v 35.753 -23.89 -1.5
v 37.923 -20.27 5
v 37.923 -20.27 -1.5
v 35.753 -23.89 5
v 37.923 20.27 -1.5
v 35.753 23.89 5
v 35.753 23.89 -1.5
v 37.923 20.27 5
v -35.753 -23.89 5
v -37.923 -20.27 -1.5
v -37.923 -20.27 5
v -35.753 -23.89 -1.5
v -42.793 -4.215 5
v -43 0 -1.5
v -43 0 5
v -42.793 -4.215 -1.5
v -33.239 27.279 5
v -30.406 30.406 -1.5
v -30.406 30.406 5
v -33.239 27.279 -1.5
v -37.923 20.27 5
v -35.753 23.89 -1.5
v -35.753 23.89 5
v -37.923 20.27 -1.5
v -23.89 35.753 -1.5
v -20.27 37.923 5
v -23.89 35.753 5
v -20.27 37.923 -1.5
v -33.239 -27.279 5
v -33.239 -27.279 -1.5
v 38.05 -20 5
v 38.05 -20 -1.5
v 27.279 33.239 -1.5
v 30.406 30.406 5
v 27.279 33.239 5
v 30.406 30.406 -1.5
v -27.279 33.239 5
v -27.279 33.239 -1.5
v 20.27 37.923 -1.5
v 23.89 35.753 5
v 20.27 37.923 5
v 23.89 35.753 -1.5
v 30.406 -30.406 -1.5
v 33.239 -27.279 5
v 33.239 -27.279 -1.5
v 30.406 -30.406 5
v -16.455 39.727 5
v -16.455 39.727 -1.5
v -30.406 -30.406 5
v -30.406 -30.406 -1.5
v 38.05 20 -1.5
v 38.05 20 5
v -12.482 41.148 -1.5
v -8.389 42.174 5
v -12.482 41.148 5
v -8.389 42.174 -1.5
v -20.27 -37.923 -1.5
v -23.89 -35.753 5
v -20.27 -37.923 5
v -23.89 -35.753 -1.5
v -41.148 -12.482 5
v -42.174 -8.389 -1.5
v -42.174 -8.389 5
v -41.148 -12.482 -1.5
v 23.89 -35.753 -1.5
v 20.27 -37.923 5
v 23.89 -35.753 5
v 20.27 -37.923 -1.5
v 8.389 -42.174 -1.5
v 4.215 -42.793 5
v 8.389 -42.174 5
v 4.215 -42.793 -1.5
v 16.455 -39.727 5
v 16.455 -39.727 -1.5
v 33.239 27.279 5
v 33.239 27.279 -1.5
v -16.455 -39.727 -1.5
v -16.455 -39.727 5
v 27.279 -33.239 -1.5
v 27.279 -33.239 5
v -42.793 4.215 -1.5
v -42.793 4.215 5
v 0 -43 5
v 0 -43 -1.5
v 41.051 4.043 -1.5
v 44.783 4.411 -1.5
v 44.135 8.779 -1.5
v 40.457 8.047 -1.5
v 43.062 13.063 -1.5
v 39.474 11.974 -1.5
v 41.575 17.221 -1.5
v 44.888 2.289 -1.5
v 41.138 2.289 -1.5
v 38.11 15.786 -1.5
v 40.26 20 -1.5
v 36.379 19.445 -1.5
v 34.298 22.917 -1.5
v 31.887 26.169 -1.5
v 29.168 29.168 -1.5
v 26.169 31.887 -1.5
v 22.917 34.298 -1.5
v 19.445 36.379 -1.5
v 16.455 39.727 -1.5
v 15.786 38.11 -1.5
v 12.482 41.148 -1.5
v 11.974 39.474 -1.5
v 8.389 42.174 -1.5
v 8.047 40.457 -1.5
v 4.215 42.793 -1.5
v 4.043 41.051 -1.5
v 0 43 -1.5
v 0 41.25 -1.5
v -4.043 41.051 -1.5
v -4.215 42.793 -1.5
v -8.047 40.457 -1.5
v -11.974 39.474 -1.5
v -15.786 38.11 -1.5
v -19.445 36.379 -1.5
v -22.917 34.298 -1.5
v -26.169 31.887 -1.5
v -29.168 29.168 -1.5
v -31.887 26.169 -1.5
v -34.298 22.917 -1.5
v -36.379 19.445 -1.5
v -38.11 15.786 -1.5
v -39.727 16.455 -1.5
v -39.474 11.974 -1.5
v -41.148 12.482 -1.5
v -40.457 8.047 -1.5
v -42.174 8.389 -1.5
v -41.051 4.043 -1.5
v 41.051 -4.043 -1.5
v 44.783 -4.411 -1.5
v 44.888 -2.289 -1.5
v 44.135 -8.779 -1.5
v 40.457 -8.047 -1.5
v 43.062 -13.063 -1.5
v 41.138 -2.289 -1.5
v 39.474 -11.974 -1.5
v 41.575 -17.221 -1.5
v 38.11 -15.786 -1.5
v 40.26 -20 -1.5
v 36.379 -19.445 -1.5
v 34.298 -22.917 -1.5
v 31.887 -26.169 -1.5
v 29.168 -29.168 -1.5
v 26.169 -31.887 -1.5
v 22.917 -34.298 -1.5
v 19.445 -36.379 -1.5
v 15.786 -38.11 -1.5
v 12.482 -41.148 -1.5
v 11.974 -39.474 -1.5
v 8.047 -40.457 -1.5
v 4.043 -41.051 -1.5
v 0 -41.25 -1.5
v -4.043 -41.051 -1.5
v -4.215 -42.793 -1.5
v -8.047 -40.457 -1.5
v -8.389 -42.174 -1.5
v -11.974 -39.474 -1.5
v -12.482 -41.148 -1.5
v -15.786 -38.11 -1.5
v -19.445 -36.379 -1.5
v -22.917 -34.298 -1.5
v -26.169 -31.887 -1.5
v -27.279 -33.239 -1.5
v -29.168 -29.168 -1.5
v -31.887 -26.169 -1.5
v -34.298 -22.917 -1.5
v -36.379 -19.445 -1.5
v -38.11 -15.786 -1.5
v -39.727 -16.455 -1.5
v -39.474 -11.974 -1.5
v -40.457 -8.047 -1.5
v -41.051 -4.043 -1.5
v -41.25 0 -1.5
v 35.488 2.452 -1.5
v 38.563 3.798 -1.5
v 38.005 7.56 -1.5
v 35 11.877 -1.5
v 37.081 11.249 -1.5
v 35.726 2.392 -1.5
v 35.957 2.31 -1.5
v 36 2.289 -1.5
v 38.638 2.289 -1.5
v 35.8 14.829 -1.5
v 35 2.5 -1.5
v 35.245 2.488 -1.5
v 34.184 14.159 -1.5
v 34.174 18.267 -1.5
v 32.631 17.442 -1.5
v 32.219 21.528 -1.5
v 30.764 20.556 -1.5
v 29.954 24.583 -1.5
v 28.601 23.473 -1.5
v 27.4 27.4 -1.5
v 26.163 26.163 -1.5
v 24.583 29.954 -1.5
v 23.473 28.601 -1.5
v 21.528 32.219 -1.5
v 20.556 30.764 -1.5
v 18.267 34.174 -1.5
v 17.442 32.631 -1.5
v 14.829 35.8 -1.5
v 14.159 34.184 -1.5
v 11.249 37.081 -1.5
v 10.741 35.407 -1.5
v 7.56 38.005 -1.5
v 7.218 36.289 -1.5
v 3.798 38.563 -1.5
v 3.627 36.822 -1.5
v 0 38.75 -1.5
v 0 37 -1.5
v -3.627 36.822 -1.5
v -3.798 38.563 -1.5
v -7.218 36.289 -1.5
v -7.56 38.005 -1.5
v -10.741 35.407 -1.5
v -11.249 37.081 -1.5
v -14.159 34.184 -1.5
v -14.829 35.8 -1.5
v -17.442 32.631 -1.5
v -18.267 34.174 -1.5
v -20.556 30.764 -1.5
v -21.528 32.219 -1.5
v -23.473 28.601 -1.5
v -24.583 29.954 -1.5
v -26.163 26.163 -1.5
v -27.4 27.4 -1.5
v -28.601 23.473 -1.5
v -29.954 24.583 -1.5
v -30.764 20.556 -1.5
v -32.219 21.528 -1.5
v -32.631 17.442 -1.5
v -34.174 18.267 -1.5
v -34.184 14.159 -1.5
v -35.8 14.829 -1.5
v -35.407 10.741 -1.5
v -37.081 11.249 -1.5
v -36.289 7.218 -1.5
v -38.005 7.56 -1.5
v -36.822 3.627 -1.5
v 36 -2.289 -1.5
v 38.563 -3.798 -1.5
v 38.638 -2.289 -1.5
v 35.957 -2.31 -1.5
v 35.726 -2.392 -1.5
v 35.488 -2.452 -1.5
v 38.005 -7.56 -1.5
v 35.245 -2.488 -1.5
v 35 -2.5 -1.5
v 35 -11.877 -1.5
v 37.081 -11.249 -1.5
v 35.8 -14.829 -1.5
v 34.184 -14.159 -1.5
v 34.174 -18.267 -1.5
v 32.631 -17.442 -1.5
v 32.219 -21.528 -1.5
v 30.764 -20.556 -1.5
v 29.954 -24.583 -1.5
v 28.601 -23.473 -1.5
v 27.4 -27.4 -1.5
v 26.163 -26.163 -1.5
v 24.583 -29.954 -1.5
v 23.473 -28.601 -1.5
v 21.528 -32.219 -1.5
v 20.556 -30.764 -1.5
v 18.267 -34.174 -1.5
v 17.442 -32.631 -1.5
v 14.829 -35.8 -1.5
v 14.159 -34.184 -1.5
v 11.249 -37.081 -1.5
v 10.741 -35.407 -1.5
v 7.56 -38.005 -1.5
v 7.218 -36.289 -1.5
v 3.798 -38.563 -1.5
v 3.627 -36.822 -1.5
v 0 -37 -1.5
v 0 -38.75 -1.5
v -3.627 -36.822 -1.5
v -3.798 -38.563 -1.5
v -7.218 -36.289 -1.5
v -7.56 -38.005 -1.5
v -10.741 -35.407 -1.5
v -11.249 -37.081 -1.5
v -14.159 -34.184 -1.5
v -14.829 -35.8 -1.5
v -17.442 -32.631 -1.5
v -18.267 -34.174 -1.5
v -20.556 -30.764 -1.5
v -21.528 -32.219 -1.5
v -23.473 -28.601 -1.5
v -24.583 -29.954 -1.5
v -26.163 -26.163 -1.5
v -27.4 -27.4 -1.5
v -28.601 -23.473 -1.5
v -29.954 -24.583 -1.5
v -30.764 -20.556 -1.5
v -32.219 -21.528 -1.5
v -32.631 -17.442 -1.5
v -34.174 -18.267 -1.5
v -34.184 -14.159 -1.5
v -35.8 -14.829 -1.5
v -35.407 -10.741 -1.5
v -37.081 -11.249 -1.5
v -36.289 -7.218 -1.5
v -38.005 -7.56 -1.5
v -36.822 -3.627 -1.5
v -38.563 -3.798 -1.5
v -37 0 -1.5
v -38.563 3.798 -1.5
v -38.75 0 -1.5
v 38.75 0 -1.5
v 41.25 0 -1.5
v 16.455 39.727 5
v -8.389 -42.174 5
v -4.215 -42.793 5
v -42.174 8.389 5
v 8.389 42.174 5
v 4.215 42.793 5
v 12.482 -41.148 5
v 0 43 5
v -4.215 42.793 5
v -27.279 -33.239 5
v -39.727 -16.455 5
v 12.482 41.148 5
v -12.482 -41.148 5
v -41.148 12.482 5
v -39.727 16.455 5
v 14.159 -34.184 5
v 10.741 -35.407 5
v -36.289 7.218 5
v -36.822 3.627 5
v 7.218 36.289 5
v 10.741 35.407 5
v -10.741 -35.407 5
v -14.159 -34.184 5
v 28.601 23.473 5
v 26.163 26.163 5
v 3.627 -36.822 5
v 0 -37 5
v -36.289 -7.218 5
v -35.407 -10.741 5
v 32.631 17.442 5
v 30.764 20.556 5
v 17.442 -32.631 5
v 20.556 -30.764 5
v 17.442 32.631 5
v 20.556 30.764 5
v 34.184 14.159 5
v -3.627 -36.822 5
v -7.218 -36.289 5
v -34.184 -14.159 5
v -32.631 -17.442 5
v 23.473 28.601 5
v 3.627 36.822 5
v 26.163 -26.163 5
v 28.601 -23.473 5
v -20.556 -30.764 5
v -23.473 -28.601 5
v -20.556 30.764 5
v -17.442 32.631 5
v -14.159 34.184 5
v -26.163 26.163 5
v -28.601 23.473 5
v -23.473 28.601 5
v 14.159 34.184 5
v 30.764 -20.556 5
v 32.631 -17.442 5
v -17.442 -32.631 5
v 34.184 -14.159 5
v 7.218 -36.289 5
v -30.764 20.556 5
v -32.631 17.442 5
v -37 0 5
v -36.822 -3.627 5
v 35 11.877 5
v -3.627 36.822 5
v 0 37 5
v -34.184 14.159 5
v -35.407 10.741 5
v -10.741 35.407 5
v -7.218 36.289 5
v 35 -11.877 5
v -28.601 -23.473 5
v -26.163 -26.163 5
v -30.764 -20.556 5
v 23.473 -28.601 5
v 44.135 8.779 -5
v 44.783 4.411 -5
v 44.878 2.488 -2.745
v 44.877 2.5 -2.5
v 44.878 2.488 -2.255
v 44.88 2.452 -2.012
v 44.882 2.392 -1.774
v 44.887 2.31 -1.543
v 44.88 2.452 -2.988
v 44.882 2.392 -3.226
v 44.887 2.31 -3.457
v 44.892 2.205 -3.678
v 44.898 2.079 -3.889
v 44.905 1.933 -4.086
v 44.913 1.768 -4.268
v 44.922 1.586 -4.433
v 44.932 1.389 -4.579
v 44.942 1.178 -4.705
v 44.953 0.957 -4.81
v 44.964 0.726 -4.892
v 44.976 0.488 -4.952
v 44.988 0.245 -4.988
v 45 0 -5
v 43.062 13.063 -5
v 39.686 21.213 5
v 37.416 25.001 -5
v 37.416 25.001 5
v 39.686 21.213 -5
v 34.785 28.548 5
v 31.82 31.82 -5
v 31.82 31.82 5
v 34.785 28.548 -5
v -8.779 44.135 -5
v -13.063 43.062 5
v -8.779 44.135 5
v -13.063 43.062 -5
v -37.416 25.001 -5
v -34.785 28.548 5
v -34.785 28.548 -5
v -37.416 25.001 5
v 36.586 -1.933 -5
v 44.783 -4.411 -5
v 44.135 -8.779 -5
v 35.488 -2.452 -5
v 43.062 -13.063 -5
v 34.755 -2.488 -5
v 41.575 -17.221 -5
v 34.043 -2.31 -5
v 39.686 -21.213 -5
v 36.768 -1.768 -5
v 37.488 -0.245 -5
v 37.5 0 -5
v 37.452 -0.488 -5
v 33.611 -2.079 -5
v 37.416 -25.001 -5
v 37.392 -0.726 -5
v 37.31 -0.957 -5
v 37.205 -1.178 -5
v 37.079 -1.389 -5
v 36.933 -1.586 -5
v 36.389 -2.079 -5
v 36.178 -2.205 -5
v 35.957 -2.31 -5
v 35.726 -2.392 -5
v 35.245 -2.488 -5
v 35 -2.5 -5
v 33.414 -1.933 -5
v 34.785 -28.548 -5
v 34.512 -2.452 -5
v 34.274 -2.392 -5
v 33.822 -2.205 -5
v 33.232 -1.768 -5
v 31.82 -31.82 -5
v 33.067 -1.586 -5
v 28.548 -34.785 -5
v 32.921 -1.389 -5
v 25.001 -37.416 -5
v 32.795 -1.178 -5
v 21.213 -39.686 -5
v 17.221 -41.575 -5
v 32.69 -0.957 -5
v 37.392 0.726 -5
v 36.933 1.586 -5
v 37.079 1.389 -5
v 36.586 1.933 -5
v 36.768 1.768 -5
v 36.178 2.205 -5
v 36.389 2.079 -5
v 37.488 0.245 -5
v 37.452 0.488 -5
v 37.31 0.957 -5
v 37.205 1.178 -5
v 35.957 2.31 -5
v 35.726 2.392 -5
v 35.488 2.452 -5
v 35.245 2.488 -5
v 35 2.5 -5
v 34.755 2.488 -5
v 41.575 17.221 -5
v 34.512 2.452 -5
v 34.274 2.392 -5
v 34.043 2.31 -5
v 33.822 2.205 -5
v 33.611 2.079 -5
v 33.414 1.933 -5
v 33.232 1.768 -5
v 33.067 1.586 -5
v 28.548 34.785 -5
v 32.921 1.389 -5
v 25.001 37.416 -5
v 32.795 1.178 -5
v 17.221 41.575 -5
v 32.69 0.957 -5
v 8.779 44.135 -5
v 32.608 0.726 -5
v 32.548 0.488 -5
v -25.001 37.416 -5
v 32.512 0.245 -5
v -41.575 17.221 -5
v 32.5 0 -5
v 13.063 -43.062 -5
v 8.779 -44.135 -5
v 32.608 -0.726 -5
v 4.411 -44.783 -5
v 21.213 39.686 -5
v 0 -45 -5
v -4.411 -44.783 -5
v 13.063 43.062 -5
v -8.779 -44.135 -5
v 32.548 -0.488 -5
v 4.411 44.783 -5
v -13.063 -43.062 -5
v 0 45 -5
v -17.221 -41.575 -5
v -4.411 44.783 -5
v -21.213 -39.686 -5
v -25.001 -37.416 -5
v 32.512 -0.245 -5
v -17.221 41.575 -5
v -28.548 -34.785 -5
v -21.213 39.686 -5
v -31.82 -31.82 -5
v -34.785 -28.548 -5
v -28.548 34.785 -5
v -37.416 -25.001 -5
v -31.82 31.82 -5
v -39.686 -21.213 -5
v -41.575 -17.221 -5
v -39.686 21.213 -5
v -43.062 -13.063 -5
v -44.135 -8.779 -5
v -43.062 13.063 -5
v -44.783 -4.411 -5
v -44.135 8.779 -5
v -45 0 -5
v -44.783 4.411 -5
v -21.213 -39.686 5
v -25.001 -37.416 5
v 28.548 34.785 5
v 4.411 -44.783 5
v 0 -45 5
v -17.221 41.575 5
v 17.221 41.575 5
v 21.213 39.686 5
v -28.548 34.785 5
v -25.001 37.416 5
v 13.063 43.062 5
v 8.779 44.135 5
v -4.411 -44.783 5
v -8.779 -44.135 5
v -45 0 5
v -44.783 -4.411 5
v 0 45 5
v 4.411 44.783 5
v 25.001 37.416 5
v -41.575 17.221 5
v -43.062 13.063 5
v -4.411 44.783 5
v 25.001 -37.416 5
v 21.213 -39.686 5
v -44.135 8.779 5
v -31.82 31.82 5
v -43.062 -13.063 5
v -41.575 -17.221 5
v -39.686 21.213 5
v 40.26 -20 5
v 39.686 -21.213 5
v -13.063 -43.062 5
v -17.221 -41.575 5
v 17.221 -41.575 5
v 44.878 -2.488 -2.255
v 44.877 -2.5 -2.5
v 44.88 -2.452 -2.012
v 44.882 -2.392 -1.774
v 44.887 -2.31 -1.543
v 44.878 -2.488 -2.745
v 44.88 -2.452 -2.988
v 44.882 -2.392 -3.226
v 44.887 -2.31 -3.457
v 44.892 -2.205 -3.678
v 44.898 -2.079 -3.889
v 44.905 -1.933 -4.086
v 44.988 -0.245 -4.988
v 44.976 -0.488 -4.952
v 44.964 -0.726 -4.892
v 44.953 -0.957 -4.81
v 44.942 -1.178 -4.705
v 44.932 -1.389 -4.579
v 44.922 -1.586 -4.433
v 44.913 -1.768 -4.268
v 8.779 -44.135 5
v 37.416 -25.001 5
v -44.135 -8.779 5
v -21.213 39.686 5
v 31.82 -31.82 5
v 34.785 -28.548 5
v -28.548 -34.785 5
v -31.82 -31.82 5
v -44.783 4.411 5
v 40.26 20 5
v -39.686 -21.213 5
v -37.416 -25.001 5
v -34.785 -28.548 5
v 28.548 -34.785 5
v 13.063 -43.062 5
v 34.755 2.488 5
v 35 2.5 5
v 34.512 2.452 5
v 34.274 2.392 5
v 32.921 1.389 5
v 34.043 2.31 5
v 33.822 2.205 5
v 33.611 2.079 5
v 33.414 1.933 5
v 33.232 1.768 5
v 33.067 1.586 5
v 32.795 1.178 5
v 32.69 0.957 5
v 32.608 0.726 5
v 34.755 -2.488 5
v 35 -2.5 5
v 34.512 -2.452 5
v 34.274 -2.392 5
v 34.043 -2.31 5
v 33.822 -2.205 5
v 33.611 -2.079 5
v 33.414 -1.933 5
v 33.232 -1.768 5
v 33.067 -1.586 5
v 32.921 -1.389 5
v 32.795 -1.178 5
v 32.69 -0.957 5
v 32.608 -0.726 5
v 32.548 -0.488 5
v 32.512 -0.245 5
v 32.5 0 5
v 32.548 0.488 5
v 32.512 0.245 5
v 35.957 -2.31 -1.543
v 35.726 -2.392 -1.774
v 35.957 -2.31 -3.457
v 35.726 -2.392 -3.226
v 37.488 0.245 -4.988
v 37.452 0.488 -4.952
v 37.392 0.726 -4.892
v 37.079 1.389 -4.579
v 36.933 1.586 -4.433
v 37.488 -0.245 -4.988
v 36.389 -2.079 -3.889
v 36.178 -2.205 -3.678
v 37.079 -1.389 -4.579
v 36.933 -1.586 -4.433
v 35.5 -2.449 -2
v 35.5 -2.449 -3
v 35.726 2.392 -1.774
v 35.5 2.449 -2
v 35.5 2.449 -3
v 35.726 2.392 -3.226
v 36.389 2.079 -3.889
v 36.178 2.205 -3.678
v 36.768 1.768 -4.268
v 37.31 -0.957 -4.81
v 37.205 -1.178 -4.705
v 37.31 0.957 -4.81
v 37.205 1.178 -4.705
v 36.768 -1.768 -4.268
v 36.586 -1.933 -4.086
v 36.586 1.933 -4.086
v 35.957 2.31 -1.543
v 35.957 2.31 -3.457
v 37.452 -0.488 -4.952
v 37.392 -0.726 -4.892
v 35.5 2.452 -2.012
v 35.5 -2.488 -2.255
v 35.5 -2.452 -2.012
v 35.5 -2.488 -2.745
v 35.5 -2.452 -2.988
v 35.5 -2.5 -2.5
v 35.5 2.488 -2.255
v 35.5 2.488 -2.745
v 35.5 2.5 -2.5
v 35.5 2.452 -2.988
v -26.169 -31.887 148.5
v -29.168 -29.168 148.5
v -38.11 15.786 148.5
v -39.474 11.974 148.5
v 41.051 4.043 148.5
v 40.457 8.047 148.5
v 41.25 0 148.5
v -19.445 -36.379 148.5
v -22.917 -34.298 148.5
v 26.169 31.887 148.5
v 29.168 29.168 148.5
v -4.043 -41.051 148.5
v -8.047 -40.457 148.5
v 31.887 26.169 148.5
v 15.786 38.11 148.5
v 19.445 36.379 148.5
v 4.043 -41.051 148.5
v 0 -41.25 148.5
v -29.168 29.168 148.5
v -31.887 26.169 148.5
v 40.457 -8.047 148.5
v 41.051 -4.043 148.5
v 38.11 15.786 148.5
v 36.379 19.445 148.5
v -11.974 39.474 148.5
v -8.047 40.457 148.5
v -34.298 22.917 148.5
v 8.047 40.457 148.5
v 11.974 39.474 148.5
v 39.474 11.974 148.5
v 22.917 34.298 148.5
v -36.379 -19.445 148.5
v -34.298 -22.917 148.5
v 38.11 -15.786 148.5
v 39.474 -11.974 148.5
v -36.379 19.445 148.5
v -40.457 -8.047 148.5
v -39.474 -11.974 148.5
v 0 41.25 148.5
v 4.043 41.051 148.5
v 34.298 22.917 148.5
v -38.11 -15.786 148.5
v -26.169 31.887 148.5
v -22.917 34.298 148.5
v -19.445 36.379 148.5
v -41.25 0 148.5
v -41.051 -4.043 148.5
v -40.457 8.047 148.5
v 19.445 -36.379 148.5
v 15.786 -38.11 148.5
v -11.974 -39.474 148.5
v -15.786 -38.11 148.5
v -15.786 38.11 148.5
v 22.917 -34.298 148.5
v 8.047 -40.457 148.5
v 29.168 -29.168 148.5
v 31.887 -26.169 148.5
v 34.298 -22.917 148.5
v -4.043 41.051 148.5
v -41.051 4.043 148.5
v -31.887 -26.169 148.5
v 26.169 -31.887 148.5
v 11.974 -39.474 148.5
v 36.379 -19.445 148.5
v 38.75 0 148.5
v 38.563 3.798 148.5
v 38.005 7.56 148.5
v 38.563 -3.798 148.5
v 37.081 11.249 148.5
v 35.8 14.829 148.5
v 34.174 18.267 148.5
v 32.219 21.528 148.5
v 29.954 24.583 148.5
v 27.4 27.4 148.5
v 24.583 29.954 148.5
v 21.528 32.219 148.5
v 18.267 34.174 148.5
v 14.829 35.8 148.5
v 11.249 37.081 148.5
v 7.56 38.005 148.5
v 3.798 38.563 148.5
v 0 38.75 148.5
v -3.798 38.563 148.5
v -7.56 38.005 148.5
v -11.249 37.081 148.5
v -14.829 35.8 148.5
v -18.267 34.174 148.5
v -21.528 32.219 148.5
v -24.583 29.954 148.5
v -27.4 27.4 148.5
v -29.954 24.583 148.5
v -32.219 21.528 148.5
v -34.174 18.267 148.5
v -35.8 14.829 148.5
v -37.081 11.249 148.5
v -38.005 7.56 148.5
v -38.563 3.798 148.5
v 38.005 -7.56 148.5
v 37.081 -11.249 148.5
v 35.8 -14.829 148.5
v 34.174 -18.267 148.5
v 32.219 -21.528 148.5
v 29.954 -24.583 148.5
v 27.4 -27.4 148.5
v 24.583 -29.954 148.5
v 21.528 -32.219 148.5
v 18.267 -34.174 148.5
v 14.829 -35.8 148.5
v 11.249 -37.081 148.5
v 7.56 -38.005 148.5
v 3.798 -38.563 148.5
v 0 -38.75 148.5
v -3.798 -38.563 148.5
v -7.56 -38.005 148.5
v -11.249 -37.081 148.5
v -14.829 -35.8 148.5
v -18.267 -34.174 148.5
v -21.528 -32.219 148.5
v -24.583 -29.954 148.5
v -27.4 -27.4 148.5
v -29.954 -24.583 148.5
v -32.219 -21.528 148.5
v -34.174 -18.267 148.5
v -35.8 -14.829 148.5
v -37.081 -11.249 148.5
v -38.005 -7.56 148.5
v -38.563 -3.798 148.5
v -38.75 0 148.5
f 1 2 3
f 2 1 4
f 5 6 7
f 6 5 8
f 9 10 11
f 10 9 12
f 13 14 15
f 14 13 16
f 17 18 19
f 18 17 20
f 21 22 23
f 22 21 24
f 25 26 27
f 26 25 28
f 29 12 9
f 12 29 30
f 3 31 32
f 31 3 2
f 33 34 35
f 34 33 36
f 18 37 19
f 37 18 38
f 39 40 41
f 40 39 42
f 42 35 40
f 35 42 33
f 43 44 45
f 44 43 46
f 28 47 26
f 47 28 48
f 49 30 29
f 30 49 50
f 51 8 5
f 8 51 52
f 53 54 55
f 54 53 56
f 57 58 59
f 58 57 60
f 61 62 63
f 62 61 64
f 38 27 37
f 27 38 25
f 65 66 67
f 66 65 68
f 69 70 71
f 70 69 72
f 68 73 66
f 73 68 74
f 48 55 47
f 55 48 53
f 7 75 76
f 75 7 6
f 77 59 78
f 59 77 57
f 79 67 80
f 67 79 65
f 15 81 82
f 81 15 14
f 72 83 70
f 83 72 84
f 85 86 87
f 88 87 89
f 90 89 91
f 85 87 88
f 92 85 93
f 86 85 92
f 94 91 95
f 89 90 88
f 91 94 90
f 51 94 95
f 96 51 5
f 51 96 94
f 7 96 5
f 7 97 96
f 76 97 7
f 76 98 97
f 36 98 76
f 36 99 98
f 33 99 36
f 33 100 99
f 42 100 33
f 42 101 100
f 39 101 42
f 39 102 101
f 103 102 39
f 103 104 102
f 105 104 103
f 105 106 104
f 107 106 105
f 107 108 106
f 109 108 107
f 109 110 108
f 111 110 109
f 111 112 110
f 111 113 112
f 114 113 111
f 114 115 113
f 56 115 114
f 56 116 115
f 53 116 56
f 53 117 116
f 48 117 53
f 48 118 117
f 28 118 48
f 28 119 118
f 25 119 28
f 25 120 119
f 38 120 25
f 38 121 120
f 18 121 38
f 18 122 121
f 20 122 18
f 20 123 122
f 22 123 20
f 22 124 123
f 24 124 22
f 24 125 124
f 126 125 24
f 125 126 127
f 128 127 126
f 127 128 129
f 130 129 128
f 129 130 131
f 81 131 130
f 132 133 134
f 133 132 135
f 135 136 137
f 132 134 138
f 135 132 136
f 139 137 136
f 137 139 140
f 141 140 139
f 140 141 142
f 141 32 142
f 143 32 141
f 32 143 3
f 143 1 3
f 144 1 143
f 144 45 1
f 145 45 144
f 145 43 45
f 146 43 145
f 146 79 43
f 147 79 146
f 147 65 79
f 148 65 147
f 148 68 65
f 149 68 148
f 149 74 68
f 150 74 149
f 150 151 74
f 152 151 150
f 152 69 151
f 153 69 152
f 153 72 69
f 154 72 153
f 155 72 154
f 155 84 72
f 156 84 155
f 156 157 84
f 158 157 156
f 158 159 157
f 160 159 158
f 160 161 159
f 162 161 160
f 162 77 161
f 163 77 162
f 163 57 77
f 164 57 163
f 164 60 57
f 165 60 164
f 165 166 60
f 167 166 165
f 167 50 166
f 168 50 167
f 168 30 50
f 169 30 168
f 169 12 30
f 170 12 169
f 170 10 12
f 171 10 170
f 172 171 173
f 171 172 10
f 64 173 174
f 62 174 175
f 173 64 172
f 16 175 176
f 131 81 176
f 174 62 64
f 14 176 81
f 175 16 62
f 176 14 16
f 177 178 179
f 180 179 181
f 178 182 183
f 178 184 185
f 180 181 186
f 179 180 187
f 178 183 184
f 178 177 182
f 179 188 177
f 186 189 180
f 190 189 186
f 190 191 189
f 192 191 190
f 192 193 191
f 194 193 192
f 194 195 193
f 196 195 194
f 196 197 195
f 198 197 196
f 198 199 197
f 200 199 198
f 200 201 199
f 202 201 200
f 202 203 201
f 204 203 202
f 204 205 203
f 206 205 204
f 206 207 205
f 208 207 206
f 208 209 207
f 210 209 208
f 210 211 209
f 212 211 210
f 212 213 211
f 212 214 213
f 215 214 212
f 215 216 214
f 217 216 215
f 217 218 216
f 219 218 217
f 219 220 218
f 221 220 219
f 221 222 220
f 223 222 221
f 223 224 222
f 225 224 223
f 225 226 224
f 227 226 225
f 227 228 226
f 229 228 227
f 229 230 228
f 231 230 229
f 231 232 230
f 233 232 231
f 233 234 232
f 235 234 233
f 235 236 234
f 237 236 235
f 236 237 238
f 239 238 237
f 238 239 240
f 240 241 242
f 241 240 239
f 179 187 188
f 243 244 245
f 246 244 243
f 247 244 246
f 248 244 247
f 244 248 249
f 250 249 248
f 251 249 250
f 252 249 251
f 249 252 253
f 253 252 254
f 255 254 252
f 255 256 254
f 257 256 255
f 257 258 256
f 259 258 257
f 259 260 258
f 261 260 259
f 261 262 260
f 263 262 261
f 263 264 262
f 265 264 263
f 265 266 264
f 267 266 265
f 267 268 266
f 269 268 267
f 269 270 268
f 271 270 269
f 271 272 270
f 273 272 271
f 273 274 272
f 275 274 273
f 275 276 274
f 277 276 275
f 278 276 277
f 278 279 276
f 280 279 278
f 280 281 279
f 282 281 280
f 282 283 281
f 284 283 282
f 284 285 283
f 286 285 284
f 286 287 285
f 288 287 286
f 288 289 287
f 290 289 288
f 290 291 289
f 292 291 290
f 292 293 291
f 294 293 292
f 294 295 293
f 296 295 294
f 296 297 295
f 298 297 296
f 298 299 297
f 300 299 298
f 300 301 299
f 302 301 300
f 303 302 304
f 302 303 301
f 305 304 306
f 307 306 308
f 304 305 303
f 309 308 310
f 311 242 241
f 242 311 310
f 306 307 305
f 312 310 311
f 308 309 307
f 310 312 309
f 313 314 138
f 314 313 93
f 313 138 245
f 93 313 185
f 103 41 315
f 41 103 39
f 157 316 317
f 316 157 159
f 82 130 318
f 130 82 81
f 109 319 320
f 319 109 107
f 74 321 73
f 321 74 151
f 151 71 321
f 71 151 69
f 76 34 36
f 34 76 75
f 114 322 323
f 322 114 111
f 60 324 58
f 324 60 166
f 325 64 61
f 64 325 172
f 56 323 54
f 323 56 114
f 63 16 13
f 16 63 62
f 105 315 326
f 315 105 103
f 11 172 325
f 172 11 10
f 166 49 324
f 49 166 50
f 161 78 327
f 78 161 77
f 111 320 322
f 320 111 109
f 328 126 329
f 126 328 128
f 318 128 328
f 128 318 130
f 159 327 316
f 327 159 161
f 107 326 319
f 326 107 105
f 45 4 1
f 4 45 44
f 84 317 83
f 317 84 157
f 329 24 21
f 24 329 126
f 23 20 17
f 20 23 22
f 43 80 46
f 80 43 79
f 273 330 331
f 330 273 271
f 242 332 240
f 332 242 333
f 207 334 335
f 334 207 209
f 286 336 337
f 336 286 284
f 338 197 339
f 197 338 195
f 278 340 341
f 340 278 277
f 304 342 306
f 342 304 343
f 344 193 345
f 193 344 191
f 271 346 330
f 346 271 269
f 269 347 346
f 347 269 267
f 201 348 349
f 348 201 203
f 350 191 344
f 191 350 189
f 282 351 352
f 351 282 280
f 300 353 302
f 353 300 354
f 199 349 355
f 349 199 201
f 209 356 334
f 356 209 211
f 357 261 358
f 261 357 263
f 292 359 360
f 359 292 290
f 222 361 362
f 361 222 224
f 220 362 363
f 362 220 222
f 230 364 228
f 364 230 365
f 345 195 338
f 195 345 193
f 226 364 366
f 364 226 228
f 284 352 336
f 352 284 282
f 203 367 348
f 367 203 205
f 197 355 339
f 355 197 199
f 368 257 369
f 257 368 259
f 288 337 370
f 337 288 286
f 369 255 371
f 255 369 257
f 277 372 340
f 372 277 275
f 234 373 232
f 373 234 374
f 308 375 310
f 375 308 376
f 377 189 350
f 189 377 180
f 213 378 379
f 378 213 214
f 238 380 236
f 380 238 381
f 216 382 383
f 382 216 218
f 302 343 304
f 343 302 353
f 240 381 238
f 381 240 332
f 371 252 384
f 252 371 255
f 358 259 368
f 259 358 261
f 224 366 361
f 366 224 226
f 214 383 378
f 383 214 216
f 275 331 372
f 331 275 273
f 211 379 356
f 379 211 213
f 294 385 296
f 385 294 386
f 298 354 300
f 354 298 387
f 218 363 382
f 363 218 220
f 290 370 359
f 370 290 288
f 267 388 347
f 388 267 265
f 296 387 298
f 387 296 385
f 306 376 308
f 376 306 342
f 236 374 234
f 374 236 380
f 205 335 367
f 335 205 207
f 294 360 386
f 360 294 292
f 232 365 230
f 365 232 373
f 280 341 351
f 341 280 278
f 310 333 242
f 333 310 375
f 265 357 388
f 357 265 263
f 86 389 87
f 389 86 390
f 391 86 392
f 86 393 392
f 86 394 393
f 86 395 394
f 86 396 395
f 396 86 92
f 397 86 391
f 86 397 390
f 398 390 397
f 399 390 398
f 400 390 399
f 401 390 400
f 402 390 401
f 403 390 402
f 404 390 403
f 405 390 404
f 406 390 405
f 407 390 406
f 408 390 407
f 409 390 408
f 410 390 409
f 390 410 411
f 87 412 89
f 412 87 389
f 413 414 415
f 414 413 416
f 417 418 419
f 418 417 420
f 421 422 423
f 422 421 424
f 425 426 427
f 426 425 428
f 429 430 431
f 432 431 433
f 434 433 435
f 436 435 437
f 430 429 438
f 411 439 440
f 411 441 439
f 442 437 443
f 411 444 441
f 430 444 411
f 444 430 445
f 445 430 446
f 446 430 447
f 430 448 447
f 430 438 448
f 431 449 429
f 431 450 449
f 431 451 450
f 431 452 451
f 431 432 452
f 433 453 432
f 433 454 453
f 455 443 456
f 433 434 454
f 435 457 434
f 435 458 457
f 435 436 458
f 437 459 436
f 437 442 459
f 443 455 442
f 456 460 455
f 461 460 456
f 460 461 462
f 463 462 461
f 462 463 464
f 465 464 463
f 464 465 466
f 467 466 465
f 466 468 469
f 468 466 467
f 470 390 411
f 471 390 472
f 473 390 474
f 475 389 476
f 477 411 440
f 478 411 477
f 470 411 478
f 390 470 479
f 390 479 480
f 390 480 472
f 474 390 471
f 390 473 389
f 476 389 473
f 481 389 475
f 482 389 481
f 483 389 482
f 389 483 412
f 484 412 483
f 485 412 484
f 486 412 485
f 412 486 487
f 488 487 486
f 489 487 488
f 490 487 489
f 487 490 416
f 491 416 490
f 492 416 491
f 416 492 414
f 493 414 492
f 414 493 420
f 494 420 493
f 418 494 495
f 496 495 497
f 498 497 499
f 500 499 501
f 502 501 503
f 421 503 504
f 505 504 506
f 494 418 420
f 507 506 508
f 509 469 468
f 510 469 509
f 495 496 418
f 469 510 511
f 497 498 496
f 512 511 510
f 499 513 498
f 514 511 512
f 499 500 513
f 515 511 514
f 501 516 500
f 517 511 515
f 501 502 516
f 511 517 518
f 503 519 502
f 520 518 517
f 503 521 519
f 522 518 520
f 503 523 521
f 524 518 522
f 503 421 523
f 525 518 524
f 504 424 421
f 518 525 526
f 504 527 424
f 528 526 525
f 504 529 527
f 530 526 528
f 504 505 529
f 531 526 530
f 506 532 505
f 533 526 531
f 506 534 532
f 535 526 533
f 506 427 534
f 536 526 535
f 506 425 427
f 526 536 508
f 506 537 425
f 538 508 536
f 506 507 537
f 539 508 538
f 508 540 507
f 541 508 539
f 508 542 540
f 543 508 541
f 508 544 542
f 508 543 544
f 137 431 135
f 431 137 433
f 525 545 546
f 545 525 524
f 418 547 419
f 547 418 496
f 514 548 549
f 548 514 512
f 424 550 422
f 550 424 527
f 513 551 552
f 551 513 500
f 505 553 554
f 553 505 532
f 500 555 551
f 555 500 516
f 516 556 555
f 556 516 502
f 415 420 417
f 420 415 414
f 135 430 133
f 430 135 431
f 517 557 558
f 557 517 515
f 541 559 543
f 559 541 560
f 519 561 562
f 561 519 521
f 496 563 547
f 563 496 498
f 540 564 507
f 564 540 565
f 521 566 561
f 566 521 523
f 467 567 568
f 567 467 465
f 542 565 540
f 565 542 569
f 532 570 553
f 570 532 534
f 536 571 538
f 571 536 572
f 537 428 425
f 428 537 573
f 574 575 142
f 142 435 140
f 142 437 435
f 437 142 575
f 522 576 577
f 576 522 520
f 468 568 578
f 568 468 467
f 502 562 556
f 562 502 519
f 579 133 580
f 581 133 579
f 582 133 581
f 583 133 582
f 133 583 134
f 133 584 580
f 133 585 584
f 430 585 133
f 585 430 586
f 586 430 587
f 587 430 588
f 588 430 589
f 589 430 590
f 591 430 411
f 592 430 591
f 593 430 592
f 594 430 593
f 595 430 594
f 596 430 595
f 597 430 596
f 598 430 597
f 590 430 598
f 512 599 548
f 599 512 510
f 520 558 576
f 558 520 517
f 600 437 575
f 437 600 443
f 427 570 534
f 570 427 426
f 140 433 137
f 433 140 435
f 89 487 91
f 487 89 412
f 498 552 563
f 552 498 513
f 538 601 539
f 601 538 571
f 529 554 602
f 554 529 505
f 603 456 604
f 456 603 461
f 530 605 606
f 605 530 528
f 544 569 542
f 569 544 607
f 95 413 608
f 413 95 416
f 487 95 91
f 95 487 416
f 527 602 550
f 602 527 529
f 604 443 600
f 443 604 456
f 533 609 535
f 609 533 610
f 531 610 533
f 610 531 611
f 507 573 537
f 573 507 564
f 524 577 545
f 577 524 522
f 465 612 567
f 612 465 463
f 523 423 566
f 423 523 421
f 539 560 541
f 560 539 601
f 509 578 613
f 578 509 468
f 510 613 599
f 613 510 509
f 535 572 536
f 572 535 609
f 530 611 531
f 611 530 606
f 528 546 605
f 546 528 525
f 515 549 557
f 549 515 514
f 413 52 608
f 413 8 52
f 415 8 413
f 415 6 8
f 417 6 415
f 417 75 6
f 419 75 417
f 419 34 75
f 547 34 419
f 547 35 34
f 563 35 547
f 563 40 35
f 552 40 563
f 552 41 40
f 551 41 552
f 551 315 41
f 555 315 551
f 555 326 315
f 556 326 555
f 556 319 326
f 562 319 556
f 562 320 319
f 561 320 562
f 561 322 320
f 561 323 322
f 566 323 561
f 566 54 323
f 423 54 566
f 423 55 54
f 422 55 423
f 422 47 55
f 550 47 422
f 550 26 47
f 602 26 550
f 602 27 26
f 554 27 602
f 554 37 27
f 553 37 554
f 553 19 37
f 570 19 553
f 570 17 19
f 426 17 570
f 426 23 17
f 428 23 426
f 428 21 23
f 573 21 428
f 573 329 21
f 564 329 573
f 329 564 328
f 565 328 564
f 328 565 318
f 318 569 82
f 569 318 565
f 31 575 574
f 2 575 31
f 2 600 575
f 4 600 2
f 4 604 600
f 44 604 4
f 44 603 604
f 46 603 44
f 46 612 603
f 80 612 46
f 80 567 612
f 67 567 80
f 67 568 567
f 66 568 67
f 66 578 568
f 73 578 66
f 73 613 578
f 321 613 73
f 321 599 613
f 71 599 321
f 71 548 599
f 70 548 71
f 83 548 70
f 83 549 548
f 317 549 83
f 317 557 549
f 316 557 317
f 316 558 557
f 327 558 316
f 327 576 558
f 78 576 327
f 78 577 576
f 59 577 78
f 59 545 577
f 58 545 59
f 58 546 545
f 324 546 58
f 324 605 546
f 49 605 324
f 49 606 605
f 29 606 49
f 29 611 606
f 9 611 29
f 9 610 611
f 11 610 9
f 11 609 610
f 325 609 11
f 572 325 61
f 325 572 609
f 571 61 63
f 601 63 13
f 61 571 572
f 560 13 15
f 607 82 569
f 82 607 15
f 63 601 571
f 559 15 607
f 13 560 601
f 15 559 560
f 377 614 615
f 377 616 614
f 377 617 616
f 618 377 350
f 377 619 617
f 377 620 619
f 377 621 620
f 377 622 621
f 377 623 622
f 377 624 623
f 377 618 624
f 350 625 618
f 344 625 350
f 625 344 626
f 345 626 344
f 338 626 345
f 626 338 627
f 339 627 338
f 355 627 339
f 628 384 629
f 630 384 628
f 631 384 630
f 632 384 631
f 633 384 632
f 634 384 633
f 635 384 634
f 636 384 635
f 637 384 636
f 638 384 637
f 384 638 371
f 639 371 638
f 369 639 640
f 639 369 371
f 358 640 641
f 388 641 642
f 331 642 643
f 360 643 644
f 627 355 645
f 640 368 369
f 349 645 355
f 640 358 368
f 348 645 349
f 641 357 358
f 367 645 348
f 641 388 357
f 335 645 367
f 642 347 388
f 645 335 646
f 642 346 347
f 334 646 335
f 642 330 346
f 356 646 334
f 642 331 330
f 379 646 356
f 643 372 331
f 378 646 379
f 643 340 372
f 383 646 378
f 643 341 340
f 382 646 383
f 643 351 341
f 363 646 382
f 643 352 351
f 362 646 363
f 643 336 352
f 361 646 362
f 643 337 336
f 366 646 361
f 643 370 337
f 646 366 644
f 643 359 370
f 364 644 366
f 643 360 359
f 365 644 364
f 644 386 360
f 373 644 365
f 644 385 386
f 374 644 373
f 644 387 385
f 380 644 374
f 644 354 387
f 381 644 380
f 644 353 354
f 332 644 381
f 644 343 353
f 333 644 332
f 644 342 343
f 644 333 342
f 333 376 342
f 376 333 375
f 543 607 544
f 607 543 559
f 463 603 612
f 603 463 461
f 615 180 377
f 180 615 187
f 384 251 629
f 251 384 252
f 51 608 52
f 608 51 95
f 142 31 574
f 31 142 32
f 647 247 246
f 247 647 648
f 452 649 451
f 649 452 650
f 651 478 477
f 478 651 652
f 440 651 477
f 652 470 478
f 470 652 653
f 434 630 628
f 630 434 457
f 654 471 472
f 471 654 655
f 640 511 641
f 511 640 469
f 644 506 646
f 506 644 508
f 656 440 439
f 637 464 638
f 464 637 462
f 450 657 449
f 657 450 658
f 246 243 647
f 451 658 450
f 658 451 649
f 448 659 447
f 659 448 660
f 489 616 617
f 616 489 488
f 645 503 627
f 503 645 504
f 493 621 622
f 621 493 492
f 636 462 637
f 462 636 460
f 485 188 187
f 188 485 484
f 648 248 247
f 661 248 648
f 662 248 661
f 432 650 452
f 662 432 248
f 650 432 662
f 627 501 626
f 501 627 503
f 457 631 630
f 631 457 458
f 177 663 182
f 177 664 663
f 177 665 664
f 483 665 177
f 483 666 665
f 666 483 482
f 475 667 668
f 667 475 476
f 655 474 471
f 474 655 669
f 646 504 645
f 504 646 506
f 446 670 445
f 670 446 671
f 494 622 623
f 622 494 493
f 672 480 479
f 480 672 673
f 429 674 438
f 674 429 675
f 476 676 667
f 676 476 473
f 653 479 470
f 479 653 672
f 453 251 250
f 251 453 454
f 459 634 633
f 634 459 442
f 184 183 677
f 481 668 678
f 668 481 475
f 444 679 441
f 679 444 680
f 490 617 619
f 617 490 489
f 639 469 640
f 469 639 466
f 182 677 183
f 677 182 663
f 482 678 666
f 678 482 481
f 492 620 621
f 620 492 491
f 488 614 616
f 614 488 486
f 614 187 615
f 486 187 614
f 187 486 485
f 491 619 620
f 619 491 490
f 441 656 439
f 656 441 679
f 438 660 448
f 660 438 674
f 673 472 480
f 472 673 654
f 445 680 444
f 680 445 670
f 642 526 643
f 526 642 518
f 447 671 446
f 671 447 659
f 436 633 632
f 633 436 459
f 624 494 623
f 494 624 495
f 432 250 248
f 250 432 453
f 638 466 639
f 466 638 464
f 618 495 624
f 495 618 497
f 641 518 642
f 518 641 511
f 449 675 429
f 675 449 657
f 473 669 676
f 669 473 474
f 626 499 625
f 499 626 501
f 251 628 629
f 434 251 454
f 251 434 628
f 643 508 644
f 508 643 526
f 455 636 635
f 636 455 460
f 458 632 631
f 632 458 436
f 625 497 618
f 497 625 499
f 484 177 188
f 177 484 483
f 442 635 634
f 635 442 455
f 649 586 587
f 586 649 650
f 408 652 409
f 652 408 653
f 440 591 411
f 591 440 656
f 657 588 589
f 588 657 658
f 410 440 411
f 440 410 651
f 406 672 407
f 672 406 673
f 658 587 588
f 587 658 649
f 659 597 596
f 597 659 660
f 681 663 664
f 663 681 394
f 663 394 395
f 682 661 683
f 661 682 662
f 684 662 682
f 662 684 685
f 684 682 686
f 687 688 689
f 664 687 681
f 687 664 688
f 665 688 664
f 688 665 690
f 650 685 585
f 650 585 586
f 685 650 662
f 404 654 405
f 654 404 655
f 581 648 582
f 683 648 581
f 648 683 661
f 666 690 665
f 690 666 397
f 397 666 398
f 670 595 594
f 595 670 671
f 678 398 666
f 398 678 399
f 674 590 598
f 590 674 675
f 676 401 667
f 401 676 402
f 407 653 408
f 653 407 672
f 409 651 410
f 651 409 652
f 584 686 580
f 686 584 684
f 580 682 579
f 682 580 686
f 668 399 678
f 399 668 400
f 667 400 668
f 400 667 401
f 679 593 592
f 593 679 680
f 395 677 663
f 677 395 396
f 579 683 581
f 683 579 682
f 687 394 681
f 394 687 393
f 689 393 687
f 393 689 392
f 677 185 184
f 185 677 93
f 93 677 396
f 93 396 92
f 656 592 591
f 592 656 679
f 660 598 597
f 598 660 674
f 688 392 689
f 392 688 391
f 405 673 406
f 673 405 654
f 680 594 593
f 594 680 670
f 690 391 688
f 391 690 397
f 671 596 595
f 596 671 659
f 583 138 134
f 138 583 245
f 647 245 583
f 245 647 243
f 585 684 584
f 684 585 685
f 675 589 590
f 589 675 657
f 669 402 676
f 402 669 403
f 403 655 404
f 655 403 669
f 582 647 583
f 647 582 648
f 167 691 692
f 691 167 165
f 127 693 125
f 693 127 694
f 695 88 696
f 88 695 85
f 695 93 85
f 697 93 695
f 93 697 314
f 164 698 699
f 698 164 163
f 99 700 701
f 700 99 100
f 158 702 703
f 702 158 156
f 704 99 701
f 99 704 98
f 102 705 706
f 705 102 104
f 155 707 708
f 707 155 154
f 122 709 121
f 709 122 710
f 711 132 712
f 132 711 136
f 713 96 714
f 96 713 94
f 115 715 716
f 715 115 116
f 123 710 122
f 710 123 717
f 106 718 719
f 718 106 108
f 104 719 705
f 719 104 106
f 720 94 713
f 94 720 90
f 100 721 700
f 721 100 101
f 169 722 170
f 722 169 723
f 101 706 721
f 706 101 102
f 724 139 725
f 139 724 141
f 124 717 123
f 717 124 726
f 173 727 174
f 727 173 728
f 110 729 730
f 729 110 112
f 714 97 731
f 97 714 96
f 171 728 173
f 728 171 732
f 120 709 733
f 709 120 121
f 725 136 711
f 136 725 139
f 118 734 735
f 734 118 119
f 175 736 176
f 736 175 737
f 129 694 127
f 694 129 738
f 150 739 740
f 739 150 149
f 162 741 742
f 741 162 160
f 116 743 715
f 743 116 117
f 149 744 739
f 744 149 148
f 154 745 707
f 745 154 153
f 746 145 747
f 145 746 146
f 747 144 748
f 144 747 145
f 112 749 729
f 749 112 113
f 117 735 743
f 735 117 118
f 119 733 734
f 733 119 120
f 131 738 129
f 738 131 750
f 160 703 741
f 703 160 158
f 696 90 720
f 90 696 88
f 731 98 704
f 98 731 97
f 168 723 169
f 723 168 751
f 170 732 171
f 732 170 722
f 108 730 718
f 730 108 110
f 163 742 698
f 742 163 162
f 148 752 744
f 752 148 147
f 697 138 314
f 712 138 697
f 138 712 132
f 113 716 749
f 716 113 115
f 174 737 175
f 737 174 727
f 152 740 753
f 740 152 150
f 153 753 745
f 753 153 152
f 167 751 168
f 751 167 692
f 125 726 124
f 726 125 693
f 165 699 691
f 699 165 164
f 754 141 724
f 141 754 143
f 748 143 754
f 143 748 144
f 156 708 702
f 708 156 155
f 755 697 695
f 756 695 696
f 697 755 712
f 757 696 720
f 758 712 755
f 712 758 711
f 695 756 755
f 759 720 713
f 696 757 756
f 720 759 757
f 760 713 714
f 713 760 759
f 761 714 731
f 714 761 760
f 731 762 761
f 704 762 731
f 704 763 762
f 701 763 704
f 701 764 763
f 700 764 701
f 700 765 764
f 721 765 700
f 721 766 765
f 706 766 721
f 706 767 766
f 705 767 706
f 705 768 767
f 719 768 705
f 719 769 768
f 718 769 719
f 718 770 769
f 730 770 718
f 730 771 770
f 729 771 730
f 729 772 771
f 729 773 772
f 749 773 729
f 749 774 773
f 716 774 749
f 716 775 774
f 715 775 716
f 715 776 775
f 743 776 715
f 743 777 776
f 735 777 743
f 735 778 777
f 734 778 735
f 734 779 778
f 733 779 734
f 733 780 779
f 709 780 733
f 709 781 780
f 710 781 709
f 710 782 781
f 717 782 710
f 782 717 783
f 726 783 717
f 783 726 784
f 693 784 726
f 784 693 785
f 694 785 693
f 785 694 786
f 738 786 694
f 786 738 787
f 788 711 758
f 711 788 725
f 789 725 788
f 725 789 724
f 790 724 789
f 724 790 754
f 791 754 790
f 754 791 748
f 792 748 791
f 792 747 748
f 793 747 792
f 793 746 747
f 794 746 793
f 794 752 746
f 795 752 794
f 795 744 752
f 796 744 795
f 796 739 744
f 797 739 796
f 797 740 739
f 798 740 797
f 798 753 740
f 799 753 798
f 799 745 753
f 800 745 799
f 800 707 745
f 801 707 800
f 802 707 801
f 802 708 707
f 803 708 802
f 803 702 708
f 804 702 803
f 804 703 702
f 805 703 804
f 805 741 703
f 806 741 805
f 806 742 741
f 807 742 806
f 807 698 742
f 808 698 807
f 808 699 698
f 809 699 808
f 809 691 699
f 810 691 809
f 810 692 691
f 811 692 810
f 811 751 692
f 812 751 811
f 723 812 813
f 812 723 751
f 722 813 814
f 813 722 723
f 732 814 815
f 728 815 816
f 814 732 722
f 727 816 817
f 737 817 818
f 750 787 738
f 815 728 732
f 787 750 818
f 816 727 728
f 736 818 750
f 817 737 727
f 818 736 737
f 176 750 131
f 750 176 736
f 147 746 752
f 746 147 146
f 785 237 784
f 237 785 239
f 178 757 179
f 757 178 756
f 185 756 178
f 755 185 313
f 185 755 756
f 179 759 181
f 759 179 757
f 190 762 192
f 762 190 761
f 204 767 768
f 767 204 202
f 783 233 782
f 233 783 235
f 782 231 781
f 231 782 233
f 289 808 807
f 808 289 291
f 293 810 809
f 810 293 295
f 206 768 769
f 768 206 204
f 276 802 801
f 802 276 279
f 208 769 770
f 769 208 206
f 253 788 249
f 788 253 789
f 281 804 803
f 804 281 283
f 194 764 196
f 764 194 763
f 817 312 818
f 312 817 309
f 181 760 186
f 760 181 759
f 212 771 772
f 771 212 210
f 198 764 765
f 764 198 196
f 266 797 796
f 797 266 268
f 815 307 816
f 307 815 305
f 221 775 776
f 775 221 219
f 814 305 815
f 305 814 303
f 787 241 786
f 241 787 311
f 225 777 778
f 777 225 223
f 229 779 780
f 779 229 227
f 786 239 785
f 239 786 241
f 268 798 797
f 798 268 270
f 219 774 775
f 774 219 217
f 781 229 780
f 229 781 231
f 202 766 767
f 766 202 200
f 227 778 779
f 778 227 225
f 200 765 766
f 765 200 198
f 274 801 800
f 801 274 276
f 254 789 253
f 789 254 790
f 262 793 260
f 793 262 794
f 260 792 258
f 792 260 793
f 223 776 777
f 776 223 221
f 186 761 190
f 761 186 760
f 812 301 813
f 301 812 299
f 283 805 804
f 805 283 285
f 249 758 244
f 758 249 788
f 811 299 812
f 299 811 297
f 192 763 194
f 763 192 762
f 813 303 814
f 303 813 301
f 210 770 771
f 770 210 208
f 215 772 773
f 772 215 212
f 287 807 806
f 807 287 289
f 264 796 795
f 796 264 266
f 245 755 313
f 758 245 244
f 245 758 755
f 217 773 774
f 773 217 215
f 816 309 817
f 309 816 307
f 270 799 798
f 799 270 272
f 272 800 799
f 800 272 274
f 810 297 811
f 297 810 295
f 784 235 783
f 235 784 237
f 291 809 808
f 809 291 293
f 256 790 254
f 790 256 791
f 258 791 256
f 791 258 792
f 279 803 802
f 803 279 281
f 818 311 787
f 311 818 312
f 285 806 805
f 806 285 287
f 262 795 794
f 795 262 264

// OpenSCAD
// file: nut_banana.scad
module nut() {
  color("pink")
    difference() {
        cylinder(d=12, h=2, center=true, $fn=6);
        cylinder(d=5.5, h=3, center=true, $fn=64);
    }
}
// file: banana.scad
include <nut_banana.scad>;

$fn = 64;
diam_hole = 5.4 + 0.5;

//translate([0,0, -25/2])
//    banana();
//    
//translate([0, 20/2, -4]) 
//rotate([0, 0, 90])
//    nut();
//    
//translate([0, -20/2, -4]) 
//rotate([0, 0, 90])
//    nut();

module banana() {
    difference() {
        base();
        holes_banana();
    }
}
module base() {
    cube([20, 40, 25], center=true);
}

module holes_banana() {
  translate([0, 20/2, 0])
    cylinder(d=diam_hole, h=50,center = true);

  translate([0, -20/2, 0])
    cylinder(d=diam_hole, h=50,center = true);
    
  translate([-3, 0, -3])
    cube([20, 40-6, 25], center=true);
}
// file: speaker_bootom.scad
include <Speaker_Walls.scad>;

bottom_kit();


module bottom_kit(){
    difference() {
        bottom();
        holes();
    }
}

module holes() {
    translate([90/2, 0, 25/2-1.5])
        cube([20, 40, 25], center = true);
    
    //vertical_hole
    translate([90/2-20/2, 0, 0])
        cylinder(d=5, h=30, center=true);
    
    //harizont_hole
    translate([90/2-20/2+8, 0, -5/2])
        rotate([0,90,0])
            cylinder(d = 5, h = 15, center = true);
}

module bottom() {
 difference() {
   cylinder(d = 90, h = 10, center=true);
  translate([0, 0, 150/2+10/4-4])
   walls(thickness=12);
 }
}
// file: Speaker_Walls.scad
// Bluetooth speaker
$fn = 64;

//walls(50);

module walls(thickness) {
 difference() {
  cylinder(d = 80+thickness/2, h = 150, center=true);
  color("red")
  cylinder(d = 80-thickness/2, h = 151, center=true);
}
}
// main file
include <Speaker_Walls.scad>;
include <speaker_bootom.scad>;
include <banana.scad>;
$fn = 64;

bottom_kit();

//translate([90/2 + 20/10, 0, 0])
// banana();
translate([0, 0, 150/2+10/4-4])
    walls(thickness=5);
//
//difference() {
// bottom_kit();
// translate([-90/2, 0, 0])
//  cube(90, center=true);
//}
